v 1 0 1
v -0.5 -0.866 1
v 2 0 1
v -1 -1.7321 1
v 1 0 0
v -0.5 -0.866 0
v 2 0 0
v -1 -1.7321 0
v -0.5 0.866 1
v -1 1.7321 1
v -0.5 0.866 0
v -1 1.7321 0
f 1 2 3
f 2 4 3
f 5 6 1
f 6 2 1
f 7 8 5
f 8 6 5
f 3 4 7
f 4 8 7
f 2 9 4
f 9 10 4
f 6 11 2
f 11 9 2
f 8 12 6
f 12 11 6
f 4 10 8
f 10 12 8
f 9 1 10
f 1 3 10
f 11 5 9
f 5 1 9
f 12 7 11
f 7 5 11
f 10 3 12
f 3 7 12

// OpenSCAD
rotate_extrude(angle=720, $fn=3) translate([-2,0]) square([1,1]);
